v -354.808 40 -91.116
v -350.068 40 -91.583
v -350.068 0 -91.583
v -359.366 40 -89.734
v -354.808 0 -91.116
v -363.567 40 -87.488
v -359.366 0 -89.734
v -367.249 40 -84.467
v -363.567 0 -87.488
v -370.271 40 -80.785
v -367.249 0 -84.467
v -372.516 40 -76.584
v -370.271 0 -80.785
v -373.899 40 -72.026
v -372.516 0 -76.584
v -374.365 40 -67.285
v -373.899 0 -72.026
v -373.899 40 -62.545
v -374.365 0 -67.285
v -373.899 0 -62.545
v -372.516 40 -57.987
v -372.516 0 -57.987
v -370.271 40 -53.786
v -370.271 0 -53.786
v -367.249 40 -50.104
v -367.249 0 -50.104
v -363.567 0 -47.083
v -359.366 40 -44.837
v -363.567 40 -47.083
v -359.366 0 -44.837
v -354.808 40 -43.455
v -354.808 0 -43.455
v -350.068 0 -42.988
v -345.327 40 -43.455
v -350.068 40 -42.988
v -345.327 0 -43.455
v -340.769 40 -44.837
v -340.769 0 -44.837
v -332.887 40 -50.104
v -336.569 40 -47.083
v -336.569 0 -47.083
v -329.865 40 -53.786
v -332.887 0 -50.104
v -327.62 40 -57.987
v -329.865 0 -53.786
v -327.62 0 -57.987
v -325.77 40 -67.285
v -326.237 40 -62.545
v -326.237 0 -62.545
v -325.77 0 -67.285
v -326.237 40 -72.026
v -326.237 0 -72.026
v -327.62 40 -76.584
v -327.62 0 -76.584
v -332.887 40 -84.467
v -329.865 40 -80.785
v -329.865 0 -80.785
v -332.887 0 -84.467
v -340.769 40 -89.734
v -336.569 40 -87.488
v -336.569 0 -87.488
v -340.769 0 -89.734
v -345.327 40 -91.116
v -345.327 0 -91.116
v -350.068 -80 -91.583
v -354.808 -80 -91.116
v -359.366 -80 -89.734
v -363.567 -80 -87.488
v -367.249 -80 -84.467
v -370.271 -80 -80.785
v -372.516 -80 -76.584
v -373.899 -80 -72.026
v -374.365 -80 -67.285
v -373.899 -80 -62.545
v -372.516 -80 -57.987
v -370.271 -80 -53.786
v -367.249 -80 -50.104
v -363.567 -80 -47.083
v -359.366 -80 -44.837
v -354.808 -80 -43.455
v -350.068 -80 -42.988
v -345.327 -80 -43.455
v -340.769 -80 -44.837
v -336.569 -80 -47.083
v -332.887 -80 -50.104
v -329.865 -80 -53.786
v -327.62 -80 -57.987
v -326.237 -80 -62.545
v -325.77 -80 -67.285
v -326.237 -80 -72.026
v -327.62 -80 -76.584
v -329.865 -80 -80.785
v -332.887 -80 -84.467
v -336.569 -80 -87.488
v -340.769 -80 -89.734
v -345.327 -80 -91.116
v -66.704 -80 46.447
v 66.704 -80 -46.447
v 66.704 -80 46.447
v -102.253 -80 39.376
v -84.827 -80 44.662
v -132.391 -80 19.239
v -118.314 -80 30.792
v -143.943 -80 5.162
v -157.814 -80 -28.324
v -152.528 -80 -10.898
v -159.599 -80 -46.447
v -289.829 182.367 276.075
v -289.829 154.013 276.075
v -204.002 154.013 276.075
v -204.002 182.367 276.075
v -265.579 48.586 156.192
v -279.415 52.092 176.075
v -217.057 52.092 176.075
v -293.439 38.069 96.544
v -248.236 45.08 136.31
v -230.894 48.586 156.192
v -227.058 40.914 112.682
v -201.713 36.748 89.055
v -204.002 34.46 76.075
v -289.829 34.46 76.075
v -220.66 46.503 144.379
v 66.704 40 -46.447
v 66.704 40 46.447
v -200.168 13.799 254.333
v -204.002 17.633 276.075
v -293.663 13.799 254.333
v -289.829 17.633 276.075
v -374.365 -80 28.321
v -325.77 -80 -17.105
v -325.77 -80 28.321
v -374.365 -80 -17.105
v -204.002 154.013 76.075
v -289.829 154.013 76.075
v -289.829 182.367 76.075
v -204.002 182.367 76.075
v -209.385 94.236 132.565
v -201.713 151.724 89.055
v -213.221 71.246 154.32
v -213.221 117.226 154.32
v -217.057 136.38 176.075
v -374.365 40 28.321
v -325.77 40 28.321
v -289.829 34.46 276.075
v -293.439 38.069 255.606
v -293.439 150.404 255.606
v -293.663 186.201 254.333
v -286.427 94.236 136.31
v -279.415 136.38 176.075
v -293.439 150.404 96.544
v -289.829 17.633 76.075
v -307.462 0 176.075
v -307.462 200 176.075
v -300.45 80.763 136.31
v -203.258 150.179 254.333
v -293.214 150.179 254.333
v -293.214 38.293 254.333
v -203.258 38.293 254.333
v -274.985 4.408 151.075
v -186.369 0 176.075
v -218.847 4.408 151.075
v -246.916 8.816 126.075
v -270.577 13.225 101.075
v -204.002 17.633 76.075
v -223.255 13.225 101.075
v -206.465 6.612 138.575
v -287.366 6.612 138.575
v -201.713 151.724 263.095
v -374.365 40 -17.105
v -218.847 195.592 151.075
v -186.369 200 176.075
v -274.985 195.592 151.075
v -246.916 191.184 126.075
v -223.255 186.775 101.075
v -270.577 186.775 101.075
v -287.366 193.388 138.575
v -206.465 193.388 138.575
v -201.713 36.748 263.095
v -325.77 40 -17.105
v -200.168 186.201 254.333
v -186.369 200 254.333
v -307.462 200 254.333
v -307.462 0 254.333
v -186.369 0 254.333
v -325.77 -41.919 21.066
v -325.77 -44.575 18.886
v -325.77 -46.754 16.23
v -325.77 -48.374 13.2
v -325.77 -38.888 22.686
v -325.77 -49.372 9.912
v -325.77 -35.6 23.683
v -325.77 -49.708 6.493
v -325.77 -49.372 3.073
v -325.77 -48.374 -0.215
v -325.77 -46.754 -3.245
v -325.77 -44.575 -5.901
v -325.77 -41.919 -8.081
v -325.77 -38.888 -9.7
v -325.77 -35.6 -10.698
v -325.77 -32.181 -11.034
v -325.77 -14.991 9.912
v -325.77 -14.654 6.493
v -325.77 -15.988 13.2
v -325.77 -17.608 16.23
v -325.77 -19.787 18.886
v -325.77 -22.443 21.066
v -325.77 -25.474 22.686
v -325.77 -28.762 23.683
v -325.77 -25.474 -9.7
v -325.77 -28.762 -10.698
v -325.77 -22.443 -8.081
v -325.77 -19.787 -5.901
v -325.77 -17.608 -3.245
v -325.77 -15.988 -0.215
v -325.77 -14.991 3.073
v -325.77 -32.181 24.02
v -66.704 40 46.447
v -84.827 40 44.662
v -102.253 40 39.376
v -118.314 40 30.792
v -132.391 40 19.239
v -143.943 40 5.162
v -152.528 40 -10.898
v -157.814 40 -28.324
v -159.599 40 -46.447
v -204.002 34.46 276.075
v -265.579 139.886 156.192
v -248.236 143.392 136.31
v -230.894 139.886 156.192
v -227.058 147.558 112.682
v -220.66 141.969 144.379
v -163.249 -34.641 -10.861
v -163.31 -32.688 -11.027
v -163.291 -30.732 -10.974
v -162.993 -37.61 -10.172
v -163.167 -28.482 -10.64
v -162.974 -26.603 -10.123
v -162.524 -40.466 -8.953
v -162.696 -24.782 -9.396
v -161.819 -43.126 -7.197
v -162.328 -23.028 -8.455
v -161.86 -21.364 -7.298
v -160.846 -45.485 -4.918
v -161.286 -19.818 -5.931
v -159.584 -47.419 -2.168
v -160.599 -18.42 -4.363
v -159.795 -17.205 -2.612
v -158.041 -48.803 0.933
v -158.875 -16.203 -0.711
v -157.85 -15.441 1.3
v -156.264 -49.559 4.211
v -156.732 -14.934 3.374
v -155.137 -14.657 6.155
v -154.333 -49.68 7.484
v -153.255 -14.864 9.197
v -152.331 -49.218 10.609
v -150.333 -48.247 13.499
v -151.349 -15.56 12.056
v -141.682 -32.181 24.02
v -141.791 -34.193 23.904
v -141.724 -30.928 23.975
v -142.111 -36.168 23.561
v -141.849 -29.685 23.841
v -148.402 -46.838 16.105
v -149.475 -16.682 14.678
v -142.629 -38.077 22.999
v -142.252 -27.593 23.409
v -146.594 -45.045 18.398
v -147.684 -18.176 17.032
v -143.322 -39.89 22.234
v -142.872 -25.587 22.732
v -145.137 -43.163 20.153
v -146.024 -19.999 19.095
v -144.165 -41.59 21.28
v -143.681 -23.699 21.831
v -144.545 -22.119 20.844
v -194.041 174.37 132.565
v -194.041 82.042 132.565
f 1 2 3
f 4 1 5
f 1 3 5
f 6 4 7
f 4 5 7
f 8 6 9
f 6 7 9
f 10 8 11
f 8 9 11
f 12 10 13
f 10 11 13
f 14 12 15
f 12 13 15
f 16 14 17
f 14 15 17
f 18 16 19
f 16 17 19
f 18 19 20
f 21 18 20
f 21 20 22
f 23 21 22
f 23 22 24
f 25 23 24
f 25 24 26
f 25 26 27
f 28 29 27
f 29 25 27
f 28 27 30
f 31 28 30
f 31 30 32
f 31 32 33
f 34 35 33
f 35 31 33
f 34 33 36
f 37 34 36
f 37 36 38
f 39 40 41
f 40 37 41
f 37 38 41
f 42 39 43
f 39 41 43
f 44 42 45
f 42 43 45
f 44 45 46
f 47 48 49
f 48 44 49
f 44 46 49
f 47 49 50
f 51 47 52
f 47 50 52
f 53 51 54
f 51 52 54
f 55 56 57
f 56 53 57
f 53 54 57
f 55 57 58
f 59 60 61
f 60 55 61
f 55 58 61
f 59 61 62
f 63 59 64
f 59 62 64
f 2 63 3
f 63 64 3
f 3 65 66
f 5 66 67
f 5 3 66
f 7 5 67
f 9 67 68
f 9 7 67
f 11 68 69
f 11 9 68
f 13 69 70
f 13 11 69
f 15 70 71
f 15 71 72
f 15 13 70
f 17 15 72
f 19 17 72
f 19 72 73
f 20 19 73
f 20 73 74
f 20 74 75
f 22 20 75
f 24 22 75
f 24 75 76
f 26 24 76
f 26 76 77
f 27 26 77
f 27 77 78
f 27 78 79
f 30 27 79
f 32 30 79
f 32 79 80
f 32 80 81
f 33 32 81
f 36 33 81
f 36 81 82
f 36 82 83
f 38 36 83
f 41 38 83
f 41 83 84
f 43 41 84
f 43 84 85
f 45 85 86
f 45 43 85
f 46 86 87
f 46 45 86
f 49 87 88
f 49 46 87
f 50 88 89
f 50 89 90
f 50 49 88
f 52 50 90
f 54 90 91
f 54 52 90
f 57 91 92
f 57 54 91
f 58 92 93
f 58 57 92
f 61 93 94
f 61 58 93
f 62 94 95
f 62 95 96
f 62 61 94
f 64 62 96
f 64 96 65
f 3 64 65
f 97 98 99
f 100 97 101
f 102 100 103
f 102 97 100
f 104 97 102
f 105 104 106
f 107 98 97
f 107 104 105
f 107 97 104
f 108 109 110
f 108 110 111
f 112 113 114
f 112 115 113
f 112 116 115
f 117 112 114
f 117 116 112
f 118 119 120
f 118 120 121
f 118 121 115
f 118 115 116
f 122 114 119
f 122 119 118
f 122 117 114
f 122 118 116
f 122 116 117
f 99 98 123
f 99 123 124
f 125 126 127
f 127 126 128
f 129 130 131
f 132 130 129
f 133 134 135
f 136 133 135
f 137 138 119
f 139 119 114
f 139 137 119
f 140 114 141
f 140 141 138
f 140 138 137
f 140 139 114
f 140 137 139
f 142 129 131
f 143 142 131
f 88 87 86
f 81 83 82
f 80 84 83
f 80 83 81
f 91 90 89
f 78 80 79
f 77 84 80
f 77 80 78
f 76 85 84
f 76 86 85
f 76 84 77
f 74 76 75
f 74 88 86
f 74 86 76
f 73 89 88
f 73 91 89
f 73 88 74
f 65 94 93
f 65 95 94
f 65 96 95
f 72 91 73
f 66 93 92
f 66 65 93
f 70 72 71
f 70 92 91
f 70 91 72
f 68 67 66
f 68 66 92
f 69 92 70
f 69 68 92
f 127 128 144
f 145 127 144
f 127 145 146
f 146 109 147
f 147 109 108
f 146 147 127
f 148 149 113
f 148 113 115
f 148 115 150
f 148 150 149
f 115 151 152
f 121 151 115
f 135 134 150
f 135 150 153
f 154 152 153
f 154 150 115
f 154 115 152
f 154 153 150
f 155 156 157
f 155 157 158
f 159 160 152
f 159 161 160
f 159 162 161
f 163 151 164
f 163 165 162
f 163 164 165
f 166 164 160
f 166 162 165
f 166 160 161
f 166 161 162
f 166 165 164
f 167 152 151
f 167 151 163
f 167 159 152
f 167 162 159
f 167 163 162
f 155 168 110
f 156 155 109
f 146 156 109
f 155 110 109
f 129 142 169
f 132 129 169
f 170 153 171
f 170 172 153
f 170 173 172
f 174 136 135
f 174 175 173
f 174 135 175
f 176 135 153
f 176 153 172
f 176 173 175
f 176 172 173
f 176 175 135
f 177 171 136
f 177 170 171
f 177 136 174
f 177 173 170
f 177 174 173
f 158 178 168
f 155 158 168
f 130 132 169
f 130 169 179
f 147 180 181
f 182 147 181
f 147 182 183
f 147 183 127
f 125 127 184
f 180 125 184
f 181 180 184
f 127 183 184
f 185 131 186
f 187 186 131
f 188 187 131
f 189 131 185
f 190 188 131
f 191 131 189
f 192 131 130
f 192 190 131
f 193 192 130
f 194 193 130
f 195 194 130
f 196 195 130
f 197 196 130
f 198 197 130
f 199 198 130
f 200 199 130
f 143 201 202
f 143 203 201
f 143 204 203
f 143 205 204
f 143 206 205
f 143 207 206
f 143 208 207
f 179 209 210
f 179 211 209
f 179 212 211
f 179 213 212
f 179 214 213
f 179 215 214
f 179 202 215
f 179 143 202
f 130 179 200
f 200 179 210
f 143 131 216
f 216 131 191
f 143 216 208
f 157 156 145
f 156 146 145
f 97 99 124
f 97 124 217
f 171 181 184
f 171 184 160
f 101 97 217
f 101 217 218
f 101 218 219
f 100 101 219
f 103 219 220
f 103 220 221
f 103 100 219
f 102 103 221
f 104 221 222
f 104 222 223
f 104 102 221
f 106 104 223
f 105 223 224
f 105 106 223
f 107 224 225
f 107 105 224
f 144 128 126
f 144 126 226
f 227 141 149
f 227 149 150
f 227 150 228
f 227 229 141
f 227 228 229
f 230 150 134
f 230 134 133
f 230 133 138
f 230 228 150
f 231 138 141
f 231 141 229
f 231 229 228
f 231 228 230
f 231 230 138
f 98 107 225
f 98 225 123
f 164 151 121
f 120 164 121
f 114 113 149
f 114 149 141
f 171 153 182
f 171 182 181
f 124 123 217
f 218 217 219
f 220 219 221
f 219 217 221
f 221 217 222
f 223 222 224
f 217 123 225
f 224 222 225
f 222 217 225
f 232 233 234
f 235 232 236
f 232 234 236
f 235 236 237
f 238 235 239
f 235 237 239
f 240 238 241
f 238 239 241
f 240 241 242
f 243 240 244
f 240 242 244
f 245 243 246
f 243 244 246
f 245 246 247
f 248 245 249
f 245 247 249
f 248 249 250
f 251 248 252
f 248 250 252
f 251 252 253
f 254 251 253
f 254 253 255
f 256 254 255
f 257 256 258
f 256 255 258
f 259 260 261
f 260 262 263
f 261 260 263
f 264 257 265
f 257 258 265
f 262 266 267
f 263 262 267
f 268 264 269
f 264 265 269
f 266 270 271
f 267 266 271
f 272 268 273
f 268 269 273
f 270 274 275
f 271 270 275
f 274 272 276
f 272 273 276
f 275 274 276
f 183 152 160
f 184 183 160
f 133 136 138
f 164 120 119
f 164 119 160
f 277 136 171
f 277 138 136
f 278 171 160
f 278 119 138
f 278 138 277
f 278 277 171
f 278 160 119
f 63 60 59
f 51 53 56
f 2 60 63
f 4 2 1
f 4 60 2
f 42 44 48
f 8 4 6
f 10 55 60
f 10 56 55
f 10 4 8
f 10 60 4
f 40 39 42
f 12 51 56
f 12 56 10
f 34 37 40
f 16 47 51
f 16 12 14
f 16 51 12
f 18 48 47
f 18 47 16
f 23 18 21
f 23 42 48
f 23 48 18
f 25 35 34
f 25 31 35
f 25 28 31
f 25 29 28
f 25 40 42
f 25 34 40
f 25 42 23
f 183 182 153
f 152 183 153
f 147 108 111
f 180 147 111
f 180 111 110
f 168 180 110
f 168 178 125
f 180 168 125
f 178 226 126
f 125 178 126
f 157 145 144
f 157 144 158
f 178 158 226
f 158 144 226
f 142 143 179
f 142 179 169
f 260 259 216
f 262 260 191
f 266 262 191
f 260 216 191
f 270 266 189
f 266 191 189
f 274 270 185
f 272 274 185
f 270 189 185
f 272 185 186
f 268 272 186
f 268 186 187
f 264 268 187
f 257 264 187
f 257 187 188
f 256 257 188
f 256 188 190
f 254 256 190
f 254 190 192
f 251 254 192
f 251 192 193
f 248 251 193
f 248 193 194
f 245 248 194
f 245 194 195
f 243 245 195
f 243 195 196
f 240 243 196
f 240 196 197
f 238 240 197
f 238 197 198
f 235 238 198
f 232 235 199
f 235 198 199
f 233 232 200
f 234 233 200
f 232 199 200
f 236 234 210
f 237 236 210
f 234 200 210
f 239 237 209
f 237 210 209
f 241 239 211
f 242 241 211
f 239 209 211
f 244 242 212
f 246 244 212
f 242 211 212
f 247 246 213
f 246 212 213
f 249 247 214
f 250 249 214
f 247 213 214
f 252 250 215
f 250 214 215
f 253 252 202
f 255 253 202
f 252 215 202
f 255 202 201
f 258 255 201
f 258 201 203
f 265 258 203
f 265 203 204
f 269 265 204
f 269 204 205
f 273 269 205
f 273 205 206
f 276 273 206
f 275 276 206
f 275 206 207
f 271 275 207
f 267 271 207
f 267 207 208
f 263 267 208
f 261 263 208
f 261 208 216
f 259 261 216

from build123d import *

# Parameters (mm, degrees)
CUBE_DEPTH                      = 40
CUBE_DEPTH_BACK                 = 80
BOSS_EXTRUDE2_REACH             = 186.47
SKETCH2_R                       = 24.297750185
SKETCH2_W                       = 48.59550037
SKETCH2_H                       = 45.426228606
BOSS_EXTRUDE2_DIRECTION_2_REACH = 186.47
BOSS_EXTRUDE3_REACH             = 412.881
BOSS_EXTRUDE3_END_RADIUS        = 102.894702313
SKETCH3_R                       = 17.52720412
SKETCH4_W                       = 121.092692674
SKETCH4_H                       = 78.257623931
BOSS_EXTRUDE4_DEPTH             = 200
SKETCH5_W                       = 121.092692674
SKETCH5_H                       = 200
SKETCH5_W_2                     = 62.357770304
SKETCH5_H_2                     = 84.288111015
BOSS_EXTRUDE5_DEPTH             = 100
BOSS_EXTRUDE5_TAPER             = 10
BOSS_EXTRUDE5_OTHER_WAY_DEPTH   = 100
BOSS_EXTRUDE5_OTHER_WAY_TAPER   = 10


with BuildPart() as part:
    # Rectangle for cube → cube (new, two sides: drawn at the far end of the back side and taken through both)
    with BuildSketch(Plane(origin=(0, 0, 0), x_dir=(1, 0, 0), z_dir=(0, 1, 0)).offset(-CUBE_DEPTH_BACK)):
        with BuildLine():
            Line((-159.598827762, 46.447351156), (-66.704125449, 46.447351156))
            Line((-66.704125449, 46.447351156), (66.704125449, 46.447351156))
            Line((66.704125449, 46.447351156), (66.704125449, -46.447351156))
            Line((66.704125449, -46.447351156), (-66.704125449, -46.447351156))
            ThreePointArc((-66.704125449, -46.447351156), (-132.390599391, -19.239122785), (-159.598827762, 46.447351156))
        make_face()
    extrude(amount=CUBE_DEPTH + CUBE_DEPTH_BACK)


with BuildPart() as body_2:

    # Boss-Extrude2: up to this face of the body (flat: up to its plane)
    boss_extrude2_end = Plane(part.part.faces().sort_by_distance((-37.521220462, 40, -2.482426343))[0])
    # Sketch2 → Boss-Extrude2 (new, up to the picked face)
    with BuildSketch(Plane(origin=(0, 0, 0), x_dir=(1, 0, 0), z_dir=(0, 1, 0)), mode=Mode.PRIVATE) as boss_extrude2_sk1:
        with Locations(Location((-350.067722674, 67.285453273, 0), (0, 0, 90))):
            Circle(SKETCH2_R)
    boss_extrude2_tool1 = split(extrude(boss_extrude2_sk1.sketch, amount=BOSS_EXTRUDE2_REACH, mode=Mode.PRIVATE), bisect_by=boss_extrude2_end, keep=Keep.BOTH, mode=Mode.PRIVATE)
    # Sketch2 → Boss-Extrude2 (new, up to the picked face)
    with BuildSketch(Plane(origin=(0, 0, 0), x_dir=(1, 0, 0), z_dir=(0, 1, 0)), mode=Mode.PRIVATE) as boss_extrude2_sk2:
        with Locations((-350.067722674, -5.607797281)):
            Rectangle(SKETCH2_W, SKETCH2_H)
    boss_extrude2_tool2 = split(extrude(boss_extrude2_sk2.sketch, amount=BOSS_EXTRUDE2_REACH, mode=Mode.PRIVATE), bisect_by=boss_extrude2_end, keep=Keep.BOTH, mode=Mode.PRIVATE)
    add(boss_extrude2_tool1.solids().sort_by(Axis((-350.067723, 0, -67.285453), (0, 1, 0)))[0])
    add(boss_extrude2_tool2.solids().sort_by(Axis((-350.067723, 0, 5.607797), (0, 1, 0)))[0])


    # Boss-Extrude2 direction 2: up to this face of the body (flat: up to its plane)
    boss_extrude2_direction_2_end = Plane(part.part.faces().sort_by_distance((-37.521220462, -80, -2.482426343))[0])
    # Sketch2 → Boss-Extrude2 direction 2 (add, up to the picked face)
    with BuildSketch(Plane(origin=(0, 0, 0), x_dir=(1, 0, 0), z_dir=(0, 1, 0)), mode=Mode.PRIVATE) as boss_extrude2_direction_2_sk1:
        with Locations(Location((-350.067722674, 67.285453273, 0), (0, 0, 90))):
            Circle(SKETCH2_R)
    boss_extrude2_direction_2_tool1 = split(extrude(boss_extrude2_direction_2_sk1.sketch, amount=-BOSS_EXTRUDE2_DIRECTION_2_REACH, mode=Mode.PRIVATE), bisect_by=boss_extrude2_direction_2_end, keep=Keep.BOTH, mode=Mode.PRIVATE)
    # Sketch2 → Boss-Extrude2 direction 2 (add, up to the picked face)
    with BuildSketch(Plane(origin=(0, 0, 0), x_dir=(1, 0, 0), z_dir=(0, 1, 0)), mode=Mode.PRIVATE) as boss_extrude2_direction_2_sk2:
        with Locations((-350.067722674, -5.607797281)):
            Rectangle(SKETCH2_W, SKETCH2_H)
    boss_extrude2_direction_2_tool2 = split(extrude(boss_extrude2_direction_2_sk2.sketch, amount=-BOSS_EXTRUDE2_DIRECTION_2_REACH, mode=Mode.PRIVATE), bisect_by=boss_extrude2_direction_2_end, keep=Keep.BOTH, mode=Mode.PRIVATE)
    add(boss_extrude2_direction_2_tool1.solids().sort_by(Axis((-350.067723, 0, -67.285453), (0, -1, 0)))[0])
    add(boss_extrude2_direction_2_tool2.solids().sort_by(Axis((-350.067723, 0, 5.607797), (0, -1, 0)))[0])

    # Boss-Extrude3: up to this cylinder (the profile starts outside it)
    boss_extrude3_end = Plane(origin=(-66.704125449, -32.181078, -46.447351156), z_dir=(0, 1, 0)) * Cylinder(BOSS_EXTRUDE3_END_RADIUS, 1032.551404626, mode=Mode.PRIVATE)
    # Sketch3 → Boss-Extrude3 (add, up to the surface)
    with BuildSketch(Plane(origin=(-325.769972489, 0, 0), x_dir=(0, 0, -1), z_dir=(1, 0, 0)), mode=Mode.PRIVATE) as boss_extrude3_sk1:
        with Locations(Location((-6.492795735, -32.18107782, 0), (0, 0, 180))):
            Circle(SKETCH3_R)
    boss_extrude3_tool1 = extrude(boss_extrude3_sk1.sketch, amount=BOSS_EXTRUDE3_REACH, mode=Mode.PRIVATE) - boss_extrude3_end
    add(boss_extrude3_tool1.solids().sort_by_distance((-325.769972, -32.181078, 6.492796))[0])


with BuildPart() as body_3:
    # Sketch4 → Boss-Extrude4 (new body)
    with BuildSketch(Plane(origin=(0, 0, 0), x_dir=(1, 0, 0), z_dir=(0, 1, 0))):
        with Locations((-246.915772104, -215.203987641)):
            Rectangle(SKETCH4_W, SKETCH4_H)
    extrude(amount=BOSS_EXTRUDE4_DEPTH)

    # Sketch5 → Boss-Extrude5 (add)
    with BuildSketch(Plane(origin=(0, 0, 176.075175675), x_dir=(-1, 0, 0), z_dir=(0, 0, -1))):
        with Locations((246.915772104, 100)):
            Rectangle(SKETCH5_W, SKETCH5_H)
        with Locations((248.236273577, 94.236257506)):
            Rectangle(SKETCH5_W_2, SKETCH5_H_2, mode=Mode.SUBTRACT)
    extrude(amount=BOSS_EXTRUDE5_DEPTH, taper=BOSS_EXTRUDE5_TAPER)

    # Sketch5 → Boss-Extrude5 other way (add)
    with BuildSketch(Plane(origin=(0, 0, 176.075175675), x_dir=(-1, 0, 0), z_dir=(0, 0, -1))):
        with Locations((246.915772104, 100)):
            Rectangle(SKETCH5_W, SKETCH5_H)
        with Locations((248.236273577, 94.236257506)):
            Rectangle(SKETCH5_W_2, SKETCH5_H_2, mode=Mode.SUBTRACT)
    extrude(amount=-BOSS_EXTRUDE5_OTHER_WAY_DEPTH, taper=BOSS_EXTRUDE5_OTHER_WAY_TAPER)


solid = Compound([part.part, body_2.part, body_3.part])
